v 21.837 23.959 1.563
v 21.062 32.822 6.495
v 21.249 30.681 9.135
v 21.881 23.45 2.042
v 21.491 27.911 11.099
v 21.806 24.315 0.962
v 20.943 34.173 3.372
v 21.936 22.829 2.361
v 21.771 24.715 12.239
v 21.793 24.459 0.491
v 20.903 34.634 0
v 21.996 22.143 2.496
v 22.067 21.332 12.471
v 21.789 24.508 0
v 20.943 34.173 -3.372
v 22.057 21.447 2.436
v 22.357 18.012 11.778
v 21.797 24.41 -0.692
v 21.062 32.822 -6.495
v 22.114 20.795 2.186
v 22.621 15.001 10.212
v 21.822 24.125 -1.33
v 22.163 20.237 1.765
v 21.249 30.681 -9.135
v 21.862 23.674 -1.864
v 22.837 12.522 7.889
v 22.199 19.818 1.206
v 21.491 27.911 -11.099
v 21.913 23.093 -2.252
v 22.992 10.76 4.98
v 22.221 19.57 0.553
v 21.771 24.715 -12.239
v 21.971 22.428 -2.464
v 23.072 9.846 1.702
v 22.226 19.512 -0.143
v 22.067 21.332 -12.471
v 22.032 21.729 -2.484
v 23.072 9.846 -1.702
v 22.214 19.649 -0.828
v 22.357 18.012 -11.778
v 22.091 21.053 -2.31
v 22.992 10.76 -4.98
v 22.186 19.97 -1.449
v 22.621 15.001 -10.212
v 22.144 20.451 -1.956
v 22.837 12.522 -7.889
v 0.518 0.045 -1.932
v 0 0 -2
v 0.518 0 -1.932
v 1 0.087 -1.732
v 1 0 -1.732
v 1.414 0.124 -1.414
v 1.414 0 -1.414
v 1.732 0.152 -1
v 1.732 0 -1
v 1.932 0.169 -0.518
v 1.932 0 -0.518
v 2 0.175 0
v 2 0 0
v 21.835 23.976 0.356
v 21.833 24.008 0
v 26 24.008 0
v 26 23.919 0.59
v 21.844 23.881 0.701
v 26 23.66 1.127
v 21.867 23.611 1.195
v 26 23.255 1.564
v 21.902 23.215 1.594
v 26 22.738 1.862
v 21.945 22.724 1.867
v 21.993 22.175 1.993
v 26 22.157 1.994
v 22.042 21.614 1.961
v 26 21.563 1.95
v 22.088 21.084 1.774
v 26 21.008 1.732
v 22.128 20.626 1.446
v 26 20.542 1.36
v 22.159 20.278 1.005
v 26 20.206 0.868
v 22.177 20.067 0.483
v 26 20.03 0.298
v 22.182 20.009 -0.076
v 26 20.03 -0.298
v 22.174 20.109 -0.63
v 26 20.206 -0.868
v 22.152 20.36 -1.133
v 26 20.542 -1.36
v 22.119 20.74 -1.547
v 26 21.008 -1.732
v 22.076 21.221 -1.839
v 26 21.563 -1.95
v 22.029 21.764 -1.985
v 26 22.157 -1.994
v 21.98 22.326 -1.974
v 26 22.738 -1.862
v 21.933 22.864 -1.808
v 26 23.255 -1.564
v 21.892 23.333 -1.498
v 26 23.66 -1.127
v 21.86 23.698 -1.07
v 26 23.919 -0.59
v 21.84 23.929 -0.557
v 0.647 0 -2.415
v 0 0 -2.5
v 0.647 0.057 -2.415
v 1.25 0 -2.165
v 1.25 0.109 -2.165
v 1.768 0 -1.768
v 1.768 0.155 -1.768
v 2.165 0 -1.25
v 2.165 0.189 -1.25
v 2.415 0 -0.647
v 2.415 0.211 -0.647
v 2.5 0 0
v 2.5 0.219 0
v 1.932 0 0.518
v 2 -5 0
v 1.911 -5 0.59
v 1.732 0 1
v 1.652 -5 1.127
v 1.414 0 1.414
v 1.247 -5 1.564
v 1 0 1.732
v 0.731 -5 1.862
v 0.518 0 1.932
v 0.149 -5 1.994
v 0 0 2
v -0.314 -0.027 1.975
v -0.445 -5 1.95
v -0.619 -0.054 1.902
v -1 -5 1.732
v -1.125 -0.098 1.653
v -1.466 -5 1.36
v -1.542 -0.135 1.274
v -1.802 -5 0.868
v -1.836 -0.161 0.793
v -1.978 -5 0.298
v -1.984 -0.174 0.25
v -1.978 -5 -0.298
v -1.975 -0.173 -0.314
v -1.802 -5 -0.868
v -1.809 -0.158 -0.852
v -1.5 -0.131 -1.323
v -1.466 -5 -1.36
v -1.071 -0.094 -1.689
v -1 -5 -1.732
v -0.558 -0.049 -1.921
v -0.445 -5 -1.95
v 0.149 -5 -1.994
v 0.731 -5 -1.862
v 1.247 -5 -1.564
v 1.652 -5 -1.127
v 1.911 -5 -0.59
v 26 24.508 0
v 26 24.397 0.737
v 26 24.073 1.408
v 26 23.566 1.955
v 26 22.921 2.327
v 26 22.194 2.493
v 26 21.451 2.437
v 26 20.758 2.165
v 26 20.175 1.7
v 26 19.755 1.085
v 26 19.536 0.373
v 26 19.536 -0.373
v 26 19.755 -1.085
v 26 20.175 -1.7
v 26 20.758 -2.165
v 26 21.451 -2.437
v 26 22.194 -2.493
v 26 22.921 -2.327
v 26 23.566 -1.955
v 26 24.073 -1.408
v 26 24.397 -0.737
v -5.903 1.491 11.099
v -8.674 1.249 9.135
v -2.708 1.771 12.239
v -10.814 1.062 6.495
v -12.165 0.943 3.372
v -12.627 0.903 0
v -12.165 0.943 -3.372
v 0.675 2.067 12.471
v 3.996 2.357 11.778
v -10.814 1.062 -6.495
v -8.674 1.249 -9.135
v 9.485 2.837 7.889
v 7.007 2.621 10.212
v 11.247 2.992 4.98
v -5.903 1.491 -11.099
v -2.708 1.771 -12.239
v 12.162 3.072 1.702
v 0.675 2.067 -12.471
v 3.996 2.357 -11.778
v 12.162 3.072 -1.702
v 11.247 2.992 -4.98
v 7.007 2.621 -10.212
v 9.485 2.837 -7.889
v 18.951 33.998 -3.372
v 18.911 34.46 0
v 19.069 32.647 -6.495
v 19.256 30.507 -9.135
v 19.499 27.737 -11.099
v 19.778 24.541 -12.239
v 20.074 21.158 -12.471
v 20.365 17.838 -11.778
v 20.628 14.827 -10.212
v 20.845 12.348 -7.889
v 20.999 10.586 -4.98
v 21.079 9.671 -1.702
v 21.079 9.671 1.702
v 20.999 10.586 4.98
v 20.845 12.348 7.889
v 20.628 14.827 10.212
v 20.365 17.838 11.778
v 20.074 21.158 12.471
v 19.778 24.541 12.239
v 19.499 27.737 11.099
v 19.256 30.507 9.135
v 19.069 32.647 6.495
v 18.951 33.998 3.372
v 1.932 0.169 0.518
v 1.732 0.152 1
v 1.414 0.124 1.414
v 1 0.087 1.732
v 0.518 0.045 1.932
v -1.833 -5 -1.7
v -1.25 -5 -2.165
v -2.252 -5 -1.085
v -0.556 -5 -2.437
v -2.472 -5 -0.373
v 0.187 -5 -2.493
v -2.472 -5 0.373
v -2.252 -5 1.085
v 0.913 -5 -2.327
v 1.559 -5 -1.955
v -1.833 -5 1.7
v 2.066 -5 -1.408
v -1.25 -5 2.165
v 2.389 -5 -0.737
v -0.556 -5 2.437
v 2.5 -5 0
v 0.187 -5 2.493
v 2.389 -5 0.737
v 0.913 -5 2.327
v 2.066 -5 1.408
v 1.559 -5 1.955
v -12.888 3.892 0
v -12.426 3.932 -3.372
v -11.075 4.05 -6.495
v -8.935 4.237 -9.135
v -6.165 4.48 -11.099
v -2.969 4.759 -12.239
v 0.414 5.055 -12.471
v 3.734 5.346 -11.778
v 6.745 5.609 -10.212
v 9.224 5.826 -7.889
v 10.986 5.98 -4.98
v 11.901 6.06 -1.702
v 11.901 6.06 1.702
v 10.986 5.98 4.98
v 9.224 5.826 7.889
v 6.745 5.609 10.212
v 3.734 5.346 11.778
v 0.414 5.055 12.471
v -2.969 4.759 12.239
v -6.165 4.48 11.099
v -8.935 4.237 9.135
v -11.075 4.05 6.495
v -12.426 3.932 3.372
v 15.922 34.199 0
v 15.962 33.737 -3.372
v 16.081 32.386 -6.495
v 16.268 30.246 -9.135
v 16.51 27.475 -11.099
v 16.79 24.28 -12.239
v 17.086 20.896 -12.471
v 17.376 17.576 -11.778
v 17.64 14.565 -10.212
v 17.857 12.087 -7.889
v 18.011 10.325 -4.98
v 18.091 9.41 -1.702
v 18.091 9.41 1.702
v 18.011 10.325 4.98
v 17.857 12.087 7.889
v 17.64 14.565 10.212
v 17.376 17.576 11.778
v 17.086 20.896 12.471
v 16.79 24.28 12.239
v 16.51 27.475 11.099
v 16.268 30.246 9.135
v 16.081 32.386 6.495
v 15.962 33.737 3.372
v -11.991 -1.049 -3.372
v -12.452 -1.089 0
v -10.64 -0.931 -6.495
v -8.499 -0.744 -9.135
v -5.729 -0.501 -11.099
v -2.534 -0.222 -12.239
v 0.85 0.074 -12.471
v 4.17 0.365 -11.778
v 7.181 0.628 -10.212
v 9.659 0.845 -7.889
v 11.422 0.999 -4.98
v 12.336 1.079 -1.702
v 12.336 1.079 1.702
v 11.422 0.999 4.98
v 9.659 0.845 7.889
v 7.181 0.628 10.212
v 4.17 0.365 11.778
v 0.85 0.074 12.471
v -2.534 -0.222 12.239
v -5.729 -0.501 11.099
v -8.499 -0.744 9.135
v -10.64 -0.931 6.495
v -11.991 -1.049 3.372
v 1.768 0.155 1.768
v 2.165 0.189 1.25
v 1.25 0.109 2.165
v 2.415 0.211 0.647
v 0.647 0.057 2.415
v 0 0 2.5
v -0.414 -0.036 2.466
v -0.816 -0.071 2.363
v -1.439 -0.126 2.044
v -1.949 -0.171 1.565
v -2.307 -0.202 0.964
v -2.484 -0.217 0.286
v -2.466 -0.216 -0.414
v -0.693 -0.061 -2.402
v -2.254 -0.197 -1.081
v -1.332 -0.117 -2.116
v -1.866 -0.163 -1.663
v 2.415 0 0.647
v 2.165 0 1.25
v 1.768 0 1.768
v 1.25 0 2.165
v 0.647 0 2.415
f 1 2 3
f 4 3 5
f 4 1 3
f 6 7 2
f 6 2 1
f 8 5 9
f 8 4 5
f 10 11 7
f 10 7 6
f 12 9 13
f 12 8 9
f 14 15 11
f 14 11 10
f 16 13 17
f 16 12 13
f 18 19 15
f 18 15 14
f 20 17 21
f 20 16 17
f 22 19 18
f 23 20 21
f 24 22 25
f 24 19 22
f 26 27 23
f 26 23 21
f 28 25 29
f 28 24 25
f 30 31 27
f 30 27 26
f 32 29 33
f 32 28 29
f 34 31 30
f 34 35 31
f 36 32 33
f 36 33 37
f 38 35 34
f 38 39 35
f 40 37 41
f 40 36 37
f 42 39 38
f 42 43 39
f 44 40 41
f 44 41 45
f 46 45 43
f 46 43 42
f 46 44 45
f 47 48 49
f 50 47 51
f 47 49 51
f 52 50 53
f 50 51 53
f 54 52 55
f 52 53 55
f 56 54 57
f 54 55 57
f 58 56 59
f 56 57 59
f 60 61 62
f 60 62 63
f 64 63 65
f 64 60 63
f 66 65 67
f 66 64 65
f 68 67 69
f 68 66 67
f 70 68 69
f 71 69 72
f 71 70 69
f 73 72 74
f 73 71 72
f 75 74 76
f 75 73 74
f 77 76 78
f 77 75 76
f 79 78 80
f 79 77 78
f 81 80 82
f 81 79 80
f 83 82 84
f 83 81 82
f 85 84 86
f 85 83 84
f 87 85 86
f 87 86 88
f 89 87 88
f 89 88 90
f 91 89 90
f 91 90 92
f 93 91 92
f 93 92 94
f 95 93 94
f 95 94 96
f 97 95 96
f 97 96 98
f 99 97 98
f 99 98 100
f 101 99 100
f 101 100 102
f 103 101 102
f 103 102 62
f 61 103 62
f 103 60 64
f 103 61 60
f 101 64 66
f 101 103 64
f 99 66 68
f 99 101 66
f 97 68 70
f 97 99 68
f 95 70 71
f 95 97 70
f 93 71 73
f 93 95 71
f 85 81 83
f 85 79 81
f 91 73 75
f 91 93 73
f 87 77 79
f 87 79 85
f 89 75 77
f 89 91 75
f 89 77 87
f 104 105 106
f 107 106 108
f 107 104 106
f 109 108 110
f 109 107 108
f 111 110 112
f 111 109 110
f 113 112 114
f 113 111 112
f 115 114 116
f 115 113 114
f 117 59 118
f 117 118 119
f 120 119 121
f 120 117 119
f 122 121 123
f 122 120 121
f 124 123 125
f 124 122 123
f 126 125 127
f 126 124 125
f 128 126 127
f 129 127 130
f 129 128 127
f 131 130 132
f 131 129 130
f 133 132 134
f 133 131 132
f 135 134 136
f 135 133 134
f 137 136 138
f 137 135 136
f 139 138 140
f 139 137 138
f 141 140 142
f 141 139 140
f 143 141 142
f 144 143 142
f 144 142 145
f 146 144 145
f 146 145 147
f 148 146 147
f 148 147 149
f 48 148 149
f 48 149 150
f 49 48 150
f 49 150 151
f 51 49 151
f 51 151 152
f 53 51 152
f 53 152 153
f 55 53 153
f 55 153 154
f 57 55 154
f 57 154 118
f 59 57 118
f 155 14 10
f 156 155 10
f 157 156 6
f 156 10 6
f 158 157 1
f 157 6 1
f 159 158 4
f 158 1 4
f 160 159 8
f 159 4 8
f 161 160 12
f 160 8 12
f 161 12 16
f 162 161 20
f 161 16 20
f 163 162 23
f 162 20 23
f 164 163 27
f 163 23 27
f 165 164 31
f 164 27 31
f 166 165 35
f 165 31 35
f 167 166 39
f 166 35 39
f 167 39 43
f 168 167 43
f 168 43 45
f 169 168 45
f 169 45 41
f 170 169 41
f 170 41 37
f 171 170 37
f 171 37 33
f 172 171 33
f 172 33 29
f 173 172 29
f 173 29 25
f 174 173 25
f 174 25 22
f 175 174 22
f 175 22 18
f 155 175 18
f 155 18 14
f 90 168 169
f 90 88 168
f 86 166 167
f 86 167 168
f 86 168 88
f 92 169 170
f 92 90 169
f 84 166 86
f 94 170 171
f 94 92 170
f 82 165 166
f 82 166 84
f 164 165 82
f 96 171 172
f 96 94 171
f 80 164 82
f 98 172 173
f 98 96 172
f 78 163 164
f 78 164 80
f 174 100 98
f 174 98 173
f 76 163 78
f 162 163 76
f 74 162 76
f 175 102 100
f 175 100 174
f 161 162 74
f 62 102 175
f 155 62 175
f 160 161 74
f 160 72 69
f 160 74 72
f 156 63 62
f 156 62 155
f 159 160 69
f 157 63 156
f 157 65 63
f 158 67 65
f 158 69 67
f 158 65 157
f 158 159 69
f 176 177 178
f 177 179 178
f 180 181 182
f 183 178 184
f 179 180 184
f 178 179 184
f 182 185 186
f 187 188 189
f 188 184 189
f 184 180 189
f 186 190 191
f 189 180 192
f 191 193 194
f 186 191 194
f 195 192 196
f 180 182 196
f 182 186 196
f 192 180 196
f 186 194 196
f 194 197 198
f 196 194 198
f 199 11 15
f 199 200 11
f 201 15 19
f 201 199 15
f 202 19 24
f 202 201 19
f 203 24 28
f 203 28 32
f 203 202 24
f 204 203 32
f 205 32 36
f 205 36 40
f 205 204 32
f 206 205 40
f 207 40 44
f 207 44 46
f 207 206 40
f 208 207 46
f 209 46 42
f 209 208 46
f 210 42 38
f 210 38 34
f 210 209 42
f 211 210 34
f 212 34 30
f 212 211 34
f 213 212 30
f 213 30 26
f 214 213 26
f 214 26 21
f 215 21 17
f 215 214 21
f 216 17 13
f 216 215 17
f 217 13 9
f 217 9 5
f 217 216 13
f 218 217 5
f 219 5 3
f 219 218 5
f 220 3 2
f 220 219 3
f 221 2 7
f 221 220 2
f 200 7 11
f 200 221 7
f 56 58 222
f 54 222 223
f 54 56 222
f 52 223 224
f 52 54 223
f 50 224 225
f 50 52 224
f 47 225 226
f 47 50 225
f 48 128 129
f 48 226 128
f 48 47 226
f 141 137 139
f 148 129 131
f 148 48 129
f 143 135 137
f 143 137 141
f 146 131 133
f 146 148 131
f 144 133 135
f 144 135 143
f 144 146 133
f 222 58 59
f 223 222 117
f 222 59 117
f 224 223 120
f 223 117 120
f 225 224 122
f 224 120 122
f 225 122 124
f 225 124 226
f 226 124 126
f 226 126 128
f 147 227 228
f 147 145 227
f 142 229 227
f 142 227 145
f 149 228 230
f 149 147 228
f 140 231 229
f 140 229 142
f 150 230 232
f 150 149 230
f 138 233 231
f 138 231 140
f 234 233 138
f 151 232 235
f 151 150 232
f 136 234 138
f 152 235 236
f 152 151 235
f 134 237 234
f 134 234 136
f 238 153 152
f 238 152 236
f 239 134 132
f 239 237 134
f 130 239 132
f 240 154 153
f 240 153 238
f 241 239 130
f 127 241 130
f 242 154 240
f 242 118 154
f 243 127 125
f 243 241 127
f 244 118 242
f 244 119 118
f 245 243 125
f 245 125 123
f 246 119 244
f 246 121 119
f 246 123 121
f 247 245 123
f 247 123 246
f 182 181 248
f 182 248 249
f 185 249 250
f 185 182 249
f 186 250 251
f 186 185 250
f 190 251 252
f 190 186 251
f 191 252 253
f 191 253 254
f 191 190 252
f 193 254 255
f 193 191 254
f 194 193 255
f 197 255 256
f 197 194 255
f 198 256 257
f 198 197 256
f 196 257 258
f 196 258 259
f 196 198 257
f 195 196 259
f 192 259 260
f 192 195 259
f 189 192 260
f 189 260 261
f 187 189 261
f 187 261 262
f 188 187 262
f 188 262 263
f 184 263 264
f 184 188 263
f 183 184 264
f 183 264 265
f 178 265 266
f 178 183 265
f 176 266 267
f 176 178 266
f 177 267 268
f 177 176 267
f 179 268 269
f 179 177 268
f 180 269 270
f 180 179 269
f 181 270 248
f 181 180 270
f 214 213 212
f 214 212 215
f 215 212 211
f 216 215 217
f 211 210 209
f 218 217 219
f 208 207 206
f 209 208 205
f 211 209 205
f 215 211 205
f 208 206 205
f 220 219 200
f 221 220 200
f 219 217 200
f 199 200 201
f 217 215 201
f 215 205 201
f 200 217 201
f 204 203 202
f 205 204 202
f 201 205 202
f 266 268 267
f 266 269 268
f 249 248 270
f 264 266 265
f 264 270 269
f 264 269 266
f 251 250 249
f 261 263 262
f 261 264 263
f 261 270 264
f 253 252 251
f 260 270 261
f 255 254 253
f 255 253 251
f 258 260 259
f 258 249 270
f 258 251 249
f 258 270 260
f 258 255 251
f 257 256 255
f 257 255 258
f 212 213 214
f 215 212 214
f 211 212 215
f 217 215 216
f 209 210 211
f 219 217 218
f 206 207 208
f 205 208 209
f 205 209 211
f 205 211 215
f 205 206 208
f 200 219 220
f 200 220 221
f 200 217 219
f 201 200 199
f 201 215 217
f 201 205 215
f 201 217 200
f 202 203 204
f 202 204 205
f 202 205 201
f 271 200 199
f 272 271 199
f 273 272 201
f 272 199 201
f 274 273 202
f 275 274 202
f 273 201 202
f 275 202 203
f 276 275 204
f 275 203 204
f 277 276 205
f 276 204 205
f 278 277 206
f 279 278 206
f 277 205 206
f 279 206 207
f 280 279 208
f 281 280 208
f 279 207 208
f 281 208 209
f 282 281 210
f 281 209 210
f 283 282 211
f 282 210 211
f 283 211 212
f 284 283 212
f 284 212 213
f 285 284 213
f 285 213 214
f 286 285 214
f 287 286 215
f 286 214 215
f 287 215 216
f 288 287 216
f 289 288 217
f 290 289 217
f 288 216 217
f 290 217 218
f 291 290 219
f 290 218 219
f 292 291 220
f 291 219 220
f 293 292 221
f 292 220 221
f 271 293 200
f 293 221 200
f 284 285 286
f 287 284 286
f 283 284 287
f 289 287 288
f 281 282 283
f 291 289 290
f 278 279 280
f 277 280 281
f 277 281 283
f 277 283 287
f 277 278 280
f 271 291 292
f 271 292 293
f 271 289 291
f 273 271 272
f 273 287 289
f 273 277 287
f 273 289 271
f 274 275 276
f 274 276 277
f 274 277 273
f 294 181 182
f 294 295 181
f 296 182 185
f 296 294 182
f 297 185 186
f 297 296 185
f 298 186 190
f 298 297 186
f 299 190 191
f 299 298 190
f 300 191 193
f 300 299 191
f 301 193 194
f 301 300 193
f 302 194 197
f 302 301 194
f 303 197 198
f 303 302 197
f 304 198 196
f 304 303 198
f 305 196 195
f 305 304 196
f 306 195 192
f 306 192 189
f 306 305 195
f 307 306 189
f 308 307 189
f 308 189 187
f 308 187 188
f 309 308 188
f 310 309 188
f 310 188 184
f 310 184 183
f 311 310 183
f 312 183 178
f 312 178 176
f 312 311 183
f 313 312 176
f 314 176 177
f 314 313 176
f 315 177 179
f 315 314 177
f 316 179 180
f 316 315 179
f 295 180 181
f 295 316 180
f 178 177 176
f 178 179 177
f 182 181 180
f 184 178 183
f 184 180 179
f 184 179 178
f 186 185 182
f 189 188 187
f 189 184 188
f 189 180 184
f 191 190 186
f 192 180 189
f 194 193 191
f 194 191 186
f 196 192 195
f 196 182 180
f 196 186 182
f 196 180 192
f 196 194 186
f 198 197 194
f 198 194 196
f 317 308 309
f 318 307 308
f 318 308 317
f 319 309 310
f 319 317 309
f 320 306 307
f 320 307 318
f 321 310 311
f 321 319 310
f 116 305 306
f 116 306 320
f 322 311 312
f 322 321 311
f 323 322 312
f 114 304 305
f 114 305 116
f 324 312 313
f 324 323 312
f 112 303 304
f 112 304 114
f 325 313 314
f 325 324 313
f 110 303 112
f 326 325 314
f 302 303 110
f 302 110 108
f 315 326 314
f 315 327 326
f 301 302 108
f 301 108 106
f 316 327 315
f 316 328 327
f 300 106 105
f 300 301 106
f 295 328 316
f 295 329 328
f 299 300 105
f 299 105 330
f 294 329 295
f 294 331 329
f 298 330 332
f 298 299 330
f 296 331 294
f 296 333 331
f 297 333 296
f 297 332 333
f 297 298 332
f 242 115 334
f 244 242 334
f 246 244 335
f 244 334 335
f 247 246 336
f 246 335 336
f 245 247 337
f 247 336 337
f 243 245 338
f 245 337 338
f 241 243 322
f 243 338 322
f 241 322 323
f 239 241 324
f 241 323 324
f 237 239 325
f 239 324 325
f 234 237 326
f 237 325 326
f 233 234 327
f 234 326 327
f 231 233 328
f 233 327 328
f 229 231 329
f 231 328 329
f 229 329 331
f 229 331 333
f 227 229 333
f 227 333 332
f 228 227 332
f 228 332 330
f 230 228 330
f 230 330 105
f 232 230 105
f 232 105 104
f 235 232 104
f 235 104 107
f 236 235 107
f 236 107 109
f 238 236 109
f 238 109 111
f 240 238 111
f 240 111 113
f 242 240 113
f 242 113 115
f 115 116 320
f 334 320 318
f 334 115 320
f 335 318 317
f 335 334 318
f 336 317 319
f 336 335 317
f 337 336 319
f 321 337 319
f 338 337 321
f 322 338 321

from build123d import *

# Parameters (mm, degrees)
F2_R          = 2.5
F2_R_2        = 2
F3_DEPTH      = 5
F3_DEPTH_BACK = 1
F6_START      = 21
F5_R          = 2.5
F5_R_2        = 2
F6_DEPTH      = 5
F7_DEPTH      = 3
F8_DEPTH      = 3


with BuildPart() as f1:
    # F0 (on Top) → F1 (revolve)
    with BuildSketch(Plane.XY):
        Polygon((-12.6267452116, 0.9029426118), (-12.4524337261, -1.0894467843), (0, 0), (-0.1743114855, 1.9923893962), align=None)
    revolve(axis=Axis((-0.0871557427, 0.9961946981, 0), (0.0871557427, -0.9961946981, 0)))

    # F2 (on Front) → F3 (join, two sides)
    with BuildSketch(Plane.XZ) as f3_sk:
        Circle(F2_R)
        Circle(F2_R_2, mode=Mode.SUBTRACT)
    extrude(amount=F3_DEPTH)
    extrude(f3_sk.sketch, amount=-F3_DEPTH_BACK)


with BuildPart() as f4:
    # F0 (on Top) → F4 (revolve)
    with BuildSketch(Plane.XY):
        Polygon((20.9029426118, 34.6343848867), (18.9105532157, 34.4600734012), (20, 22.0076396751), (21.9923893962, 22.1819511606), align=None)
    revolve(axis=Axis((20.9961946981, 22.0947954178, 0), (-0.9961946981, -0.0871557427, 0)))

    # F5 (on Right) → F6 (join)
    with BuildSketch(Plane.YZ.offset(F6_START)):
        with Locations((22.0076396751, 0)):
            Circle(F5_R)
        with Locations((22.0076396751, 0)):
            Circle(F5_R_2, mode=Mode.SUBTRACT)
    extrude(amount=F6_DEPTH)


with BuildPart() as f7:
    # F7 (new): a face of the model
    f7_faces = [f4.part.faces().sort_by_distance(p)[0] for p in [
        (20, 22.0076396751, 0),
    ]]
    extrude(f7_faces, amount=F7_DEPTH)


with BuildPart() as f8:
    # F8 (new): a face of the model
    f8_faces = [f1.part.faces().sort_by_distance(p)[0] for p in [
        (-0.1743114855, 1.9923893962, 0),
    ]]
    extrude(f8_faces, amount=F8_DEPTH)


solid = Compound([f1.part, f4.part, f7.part, f8.part])
